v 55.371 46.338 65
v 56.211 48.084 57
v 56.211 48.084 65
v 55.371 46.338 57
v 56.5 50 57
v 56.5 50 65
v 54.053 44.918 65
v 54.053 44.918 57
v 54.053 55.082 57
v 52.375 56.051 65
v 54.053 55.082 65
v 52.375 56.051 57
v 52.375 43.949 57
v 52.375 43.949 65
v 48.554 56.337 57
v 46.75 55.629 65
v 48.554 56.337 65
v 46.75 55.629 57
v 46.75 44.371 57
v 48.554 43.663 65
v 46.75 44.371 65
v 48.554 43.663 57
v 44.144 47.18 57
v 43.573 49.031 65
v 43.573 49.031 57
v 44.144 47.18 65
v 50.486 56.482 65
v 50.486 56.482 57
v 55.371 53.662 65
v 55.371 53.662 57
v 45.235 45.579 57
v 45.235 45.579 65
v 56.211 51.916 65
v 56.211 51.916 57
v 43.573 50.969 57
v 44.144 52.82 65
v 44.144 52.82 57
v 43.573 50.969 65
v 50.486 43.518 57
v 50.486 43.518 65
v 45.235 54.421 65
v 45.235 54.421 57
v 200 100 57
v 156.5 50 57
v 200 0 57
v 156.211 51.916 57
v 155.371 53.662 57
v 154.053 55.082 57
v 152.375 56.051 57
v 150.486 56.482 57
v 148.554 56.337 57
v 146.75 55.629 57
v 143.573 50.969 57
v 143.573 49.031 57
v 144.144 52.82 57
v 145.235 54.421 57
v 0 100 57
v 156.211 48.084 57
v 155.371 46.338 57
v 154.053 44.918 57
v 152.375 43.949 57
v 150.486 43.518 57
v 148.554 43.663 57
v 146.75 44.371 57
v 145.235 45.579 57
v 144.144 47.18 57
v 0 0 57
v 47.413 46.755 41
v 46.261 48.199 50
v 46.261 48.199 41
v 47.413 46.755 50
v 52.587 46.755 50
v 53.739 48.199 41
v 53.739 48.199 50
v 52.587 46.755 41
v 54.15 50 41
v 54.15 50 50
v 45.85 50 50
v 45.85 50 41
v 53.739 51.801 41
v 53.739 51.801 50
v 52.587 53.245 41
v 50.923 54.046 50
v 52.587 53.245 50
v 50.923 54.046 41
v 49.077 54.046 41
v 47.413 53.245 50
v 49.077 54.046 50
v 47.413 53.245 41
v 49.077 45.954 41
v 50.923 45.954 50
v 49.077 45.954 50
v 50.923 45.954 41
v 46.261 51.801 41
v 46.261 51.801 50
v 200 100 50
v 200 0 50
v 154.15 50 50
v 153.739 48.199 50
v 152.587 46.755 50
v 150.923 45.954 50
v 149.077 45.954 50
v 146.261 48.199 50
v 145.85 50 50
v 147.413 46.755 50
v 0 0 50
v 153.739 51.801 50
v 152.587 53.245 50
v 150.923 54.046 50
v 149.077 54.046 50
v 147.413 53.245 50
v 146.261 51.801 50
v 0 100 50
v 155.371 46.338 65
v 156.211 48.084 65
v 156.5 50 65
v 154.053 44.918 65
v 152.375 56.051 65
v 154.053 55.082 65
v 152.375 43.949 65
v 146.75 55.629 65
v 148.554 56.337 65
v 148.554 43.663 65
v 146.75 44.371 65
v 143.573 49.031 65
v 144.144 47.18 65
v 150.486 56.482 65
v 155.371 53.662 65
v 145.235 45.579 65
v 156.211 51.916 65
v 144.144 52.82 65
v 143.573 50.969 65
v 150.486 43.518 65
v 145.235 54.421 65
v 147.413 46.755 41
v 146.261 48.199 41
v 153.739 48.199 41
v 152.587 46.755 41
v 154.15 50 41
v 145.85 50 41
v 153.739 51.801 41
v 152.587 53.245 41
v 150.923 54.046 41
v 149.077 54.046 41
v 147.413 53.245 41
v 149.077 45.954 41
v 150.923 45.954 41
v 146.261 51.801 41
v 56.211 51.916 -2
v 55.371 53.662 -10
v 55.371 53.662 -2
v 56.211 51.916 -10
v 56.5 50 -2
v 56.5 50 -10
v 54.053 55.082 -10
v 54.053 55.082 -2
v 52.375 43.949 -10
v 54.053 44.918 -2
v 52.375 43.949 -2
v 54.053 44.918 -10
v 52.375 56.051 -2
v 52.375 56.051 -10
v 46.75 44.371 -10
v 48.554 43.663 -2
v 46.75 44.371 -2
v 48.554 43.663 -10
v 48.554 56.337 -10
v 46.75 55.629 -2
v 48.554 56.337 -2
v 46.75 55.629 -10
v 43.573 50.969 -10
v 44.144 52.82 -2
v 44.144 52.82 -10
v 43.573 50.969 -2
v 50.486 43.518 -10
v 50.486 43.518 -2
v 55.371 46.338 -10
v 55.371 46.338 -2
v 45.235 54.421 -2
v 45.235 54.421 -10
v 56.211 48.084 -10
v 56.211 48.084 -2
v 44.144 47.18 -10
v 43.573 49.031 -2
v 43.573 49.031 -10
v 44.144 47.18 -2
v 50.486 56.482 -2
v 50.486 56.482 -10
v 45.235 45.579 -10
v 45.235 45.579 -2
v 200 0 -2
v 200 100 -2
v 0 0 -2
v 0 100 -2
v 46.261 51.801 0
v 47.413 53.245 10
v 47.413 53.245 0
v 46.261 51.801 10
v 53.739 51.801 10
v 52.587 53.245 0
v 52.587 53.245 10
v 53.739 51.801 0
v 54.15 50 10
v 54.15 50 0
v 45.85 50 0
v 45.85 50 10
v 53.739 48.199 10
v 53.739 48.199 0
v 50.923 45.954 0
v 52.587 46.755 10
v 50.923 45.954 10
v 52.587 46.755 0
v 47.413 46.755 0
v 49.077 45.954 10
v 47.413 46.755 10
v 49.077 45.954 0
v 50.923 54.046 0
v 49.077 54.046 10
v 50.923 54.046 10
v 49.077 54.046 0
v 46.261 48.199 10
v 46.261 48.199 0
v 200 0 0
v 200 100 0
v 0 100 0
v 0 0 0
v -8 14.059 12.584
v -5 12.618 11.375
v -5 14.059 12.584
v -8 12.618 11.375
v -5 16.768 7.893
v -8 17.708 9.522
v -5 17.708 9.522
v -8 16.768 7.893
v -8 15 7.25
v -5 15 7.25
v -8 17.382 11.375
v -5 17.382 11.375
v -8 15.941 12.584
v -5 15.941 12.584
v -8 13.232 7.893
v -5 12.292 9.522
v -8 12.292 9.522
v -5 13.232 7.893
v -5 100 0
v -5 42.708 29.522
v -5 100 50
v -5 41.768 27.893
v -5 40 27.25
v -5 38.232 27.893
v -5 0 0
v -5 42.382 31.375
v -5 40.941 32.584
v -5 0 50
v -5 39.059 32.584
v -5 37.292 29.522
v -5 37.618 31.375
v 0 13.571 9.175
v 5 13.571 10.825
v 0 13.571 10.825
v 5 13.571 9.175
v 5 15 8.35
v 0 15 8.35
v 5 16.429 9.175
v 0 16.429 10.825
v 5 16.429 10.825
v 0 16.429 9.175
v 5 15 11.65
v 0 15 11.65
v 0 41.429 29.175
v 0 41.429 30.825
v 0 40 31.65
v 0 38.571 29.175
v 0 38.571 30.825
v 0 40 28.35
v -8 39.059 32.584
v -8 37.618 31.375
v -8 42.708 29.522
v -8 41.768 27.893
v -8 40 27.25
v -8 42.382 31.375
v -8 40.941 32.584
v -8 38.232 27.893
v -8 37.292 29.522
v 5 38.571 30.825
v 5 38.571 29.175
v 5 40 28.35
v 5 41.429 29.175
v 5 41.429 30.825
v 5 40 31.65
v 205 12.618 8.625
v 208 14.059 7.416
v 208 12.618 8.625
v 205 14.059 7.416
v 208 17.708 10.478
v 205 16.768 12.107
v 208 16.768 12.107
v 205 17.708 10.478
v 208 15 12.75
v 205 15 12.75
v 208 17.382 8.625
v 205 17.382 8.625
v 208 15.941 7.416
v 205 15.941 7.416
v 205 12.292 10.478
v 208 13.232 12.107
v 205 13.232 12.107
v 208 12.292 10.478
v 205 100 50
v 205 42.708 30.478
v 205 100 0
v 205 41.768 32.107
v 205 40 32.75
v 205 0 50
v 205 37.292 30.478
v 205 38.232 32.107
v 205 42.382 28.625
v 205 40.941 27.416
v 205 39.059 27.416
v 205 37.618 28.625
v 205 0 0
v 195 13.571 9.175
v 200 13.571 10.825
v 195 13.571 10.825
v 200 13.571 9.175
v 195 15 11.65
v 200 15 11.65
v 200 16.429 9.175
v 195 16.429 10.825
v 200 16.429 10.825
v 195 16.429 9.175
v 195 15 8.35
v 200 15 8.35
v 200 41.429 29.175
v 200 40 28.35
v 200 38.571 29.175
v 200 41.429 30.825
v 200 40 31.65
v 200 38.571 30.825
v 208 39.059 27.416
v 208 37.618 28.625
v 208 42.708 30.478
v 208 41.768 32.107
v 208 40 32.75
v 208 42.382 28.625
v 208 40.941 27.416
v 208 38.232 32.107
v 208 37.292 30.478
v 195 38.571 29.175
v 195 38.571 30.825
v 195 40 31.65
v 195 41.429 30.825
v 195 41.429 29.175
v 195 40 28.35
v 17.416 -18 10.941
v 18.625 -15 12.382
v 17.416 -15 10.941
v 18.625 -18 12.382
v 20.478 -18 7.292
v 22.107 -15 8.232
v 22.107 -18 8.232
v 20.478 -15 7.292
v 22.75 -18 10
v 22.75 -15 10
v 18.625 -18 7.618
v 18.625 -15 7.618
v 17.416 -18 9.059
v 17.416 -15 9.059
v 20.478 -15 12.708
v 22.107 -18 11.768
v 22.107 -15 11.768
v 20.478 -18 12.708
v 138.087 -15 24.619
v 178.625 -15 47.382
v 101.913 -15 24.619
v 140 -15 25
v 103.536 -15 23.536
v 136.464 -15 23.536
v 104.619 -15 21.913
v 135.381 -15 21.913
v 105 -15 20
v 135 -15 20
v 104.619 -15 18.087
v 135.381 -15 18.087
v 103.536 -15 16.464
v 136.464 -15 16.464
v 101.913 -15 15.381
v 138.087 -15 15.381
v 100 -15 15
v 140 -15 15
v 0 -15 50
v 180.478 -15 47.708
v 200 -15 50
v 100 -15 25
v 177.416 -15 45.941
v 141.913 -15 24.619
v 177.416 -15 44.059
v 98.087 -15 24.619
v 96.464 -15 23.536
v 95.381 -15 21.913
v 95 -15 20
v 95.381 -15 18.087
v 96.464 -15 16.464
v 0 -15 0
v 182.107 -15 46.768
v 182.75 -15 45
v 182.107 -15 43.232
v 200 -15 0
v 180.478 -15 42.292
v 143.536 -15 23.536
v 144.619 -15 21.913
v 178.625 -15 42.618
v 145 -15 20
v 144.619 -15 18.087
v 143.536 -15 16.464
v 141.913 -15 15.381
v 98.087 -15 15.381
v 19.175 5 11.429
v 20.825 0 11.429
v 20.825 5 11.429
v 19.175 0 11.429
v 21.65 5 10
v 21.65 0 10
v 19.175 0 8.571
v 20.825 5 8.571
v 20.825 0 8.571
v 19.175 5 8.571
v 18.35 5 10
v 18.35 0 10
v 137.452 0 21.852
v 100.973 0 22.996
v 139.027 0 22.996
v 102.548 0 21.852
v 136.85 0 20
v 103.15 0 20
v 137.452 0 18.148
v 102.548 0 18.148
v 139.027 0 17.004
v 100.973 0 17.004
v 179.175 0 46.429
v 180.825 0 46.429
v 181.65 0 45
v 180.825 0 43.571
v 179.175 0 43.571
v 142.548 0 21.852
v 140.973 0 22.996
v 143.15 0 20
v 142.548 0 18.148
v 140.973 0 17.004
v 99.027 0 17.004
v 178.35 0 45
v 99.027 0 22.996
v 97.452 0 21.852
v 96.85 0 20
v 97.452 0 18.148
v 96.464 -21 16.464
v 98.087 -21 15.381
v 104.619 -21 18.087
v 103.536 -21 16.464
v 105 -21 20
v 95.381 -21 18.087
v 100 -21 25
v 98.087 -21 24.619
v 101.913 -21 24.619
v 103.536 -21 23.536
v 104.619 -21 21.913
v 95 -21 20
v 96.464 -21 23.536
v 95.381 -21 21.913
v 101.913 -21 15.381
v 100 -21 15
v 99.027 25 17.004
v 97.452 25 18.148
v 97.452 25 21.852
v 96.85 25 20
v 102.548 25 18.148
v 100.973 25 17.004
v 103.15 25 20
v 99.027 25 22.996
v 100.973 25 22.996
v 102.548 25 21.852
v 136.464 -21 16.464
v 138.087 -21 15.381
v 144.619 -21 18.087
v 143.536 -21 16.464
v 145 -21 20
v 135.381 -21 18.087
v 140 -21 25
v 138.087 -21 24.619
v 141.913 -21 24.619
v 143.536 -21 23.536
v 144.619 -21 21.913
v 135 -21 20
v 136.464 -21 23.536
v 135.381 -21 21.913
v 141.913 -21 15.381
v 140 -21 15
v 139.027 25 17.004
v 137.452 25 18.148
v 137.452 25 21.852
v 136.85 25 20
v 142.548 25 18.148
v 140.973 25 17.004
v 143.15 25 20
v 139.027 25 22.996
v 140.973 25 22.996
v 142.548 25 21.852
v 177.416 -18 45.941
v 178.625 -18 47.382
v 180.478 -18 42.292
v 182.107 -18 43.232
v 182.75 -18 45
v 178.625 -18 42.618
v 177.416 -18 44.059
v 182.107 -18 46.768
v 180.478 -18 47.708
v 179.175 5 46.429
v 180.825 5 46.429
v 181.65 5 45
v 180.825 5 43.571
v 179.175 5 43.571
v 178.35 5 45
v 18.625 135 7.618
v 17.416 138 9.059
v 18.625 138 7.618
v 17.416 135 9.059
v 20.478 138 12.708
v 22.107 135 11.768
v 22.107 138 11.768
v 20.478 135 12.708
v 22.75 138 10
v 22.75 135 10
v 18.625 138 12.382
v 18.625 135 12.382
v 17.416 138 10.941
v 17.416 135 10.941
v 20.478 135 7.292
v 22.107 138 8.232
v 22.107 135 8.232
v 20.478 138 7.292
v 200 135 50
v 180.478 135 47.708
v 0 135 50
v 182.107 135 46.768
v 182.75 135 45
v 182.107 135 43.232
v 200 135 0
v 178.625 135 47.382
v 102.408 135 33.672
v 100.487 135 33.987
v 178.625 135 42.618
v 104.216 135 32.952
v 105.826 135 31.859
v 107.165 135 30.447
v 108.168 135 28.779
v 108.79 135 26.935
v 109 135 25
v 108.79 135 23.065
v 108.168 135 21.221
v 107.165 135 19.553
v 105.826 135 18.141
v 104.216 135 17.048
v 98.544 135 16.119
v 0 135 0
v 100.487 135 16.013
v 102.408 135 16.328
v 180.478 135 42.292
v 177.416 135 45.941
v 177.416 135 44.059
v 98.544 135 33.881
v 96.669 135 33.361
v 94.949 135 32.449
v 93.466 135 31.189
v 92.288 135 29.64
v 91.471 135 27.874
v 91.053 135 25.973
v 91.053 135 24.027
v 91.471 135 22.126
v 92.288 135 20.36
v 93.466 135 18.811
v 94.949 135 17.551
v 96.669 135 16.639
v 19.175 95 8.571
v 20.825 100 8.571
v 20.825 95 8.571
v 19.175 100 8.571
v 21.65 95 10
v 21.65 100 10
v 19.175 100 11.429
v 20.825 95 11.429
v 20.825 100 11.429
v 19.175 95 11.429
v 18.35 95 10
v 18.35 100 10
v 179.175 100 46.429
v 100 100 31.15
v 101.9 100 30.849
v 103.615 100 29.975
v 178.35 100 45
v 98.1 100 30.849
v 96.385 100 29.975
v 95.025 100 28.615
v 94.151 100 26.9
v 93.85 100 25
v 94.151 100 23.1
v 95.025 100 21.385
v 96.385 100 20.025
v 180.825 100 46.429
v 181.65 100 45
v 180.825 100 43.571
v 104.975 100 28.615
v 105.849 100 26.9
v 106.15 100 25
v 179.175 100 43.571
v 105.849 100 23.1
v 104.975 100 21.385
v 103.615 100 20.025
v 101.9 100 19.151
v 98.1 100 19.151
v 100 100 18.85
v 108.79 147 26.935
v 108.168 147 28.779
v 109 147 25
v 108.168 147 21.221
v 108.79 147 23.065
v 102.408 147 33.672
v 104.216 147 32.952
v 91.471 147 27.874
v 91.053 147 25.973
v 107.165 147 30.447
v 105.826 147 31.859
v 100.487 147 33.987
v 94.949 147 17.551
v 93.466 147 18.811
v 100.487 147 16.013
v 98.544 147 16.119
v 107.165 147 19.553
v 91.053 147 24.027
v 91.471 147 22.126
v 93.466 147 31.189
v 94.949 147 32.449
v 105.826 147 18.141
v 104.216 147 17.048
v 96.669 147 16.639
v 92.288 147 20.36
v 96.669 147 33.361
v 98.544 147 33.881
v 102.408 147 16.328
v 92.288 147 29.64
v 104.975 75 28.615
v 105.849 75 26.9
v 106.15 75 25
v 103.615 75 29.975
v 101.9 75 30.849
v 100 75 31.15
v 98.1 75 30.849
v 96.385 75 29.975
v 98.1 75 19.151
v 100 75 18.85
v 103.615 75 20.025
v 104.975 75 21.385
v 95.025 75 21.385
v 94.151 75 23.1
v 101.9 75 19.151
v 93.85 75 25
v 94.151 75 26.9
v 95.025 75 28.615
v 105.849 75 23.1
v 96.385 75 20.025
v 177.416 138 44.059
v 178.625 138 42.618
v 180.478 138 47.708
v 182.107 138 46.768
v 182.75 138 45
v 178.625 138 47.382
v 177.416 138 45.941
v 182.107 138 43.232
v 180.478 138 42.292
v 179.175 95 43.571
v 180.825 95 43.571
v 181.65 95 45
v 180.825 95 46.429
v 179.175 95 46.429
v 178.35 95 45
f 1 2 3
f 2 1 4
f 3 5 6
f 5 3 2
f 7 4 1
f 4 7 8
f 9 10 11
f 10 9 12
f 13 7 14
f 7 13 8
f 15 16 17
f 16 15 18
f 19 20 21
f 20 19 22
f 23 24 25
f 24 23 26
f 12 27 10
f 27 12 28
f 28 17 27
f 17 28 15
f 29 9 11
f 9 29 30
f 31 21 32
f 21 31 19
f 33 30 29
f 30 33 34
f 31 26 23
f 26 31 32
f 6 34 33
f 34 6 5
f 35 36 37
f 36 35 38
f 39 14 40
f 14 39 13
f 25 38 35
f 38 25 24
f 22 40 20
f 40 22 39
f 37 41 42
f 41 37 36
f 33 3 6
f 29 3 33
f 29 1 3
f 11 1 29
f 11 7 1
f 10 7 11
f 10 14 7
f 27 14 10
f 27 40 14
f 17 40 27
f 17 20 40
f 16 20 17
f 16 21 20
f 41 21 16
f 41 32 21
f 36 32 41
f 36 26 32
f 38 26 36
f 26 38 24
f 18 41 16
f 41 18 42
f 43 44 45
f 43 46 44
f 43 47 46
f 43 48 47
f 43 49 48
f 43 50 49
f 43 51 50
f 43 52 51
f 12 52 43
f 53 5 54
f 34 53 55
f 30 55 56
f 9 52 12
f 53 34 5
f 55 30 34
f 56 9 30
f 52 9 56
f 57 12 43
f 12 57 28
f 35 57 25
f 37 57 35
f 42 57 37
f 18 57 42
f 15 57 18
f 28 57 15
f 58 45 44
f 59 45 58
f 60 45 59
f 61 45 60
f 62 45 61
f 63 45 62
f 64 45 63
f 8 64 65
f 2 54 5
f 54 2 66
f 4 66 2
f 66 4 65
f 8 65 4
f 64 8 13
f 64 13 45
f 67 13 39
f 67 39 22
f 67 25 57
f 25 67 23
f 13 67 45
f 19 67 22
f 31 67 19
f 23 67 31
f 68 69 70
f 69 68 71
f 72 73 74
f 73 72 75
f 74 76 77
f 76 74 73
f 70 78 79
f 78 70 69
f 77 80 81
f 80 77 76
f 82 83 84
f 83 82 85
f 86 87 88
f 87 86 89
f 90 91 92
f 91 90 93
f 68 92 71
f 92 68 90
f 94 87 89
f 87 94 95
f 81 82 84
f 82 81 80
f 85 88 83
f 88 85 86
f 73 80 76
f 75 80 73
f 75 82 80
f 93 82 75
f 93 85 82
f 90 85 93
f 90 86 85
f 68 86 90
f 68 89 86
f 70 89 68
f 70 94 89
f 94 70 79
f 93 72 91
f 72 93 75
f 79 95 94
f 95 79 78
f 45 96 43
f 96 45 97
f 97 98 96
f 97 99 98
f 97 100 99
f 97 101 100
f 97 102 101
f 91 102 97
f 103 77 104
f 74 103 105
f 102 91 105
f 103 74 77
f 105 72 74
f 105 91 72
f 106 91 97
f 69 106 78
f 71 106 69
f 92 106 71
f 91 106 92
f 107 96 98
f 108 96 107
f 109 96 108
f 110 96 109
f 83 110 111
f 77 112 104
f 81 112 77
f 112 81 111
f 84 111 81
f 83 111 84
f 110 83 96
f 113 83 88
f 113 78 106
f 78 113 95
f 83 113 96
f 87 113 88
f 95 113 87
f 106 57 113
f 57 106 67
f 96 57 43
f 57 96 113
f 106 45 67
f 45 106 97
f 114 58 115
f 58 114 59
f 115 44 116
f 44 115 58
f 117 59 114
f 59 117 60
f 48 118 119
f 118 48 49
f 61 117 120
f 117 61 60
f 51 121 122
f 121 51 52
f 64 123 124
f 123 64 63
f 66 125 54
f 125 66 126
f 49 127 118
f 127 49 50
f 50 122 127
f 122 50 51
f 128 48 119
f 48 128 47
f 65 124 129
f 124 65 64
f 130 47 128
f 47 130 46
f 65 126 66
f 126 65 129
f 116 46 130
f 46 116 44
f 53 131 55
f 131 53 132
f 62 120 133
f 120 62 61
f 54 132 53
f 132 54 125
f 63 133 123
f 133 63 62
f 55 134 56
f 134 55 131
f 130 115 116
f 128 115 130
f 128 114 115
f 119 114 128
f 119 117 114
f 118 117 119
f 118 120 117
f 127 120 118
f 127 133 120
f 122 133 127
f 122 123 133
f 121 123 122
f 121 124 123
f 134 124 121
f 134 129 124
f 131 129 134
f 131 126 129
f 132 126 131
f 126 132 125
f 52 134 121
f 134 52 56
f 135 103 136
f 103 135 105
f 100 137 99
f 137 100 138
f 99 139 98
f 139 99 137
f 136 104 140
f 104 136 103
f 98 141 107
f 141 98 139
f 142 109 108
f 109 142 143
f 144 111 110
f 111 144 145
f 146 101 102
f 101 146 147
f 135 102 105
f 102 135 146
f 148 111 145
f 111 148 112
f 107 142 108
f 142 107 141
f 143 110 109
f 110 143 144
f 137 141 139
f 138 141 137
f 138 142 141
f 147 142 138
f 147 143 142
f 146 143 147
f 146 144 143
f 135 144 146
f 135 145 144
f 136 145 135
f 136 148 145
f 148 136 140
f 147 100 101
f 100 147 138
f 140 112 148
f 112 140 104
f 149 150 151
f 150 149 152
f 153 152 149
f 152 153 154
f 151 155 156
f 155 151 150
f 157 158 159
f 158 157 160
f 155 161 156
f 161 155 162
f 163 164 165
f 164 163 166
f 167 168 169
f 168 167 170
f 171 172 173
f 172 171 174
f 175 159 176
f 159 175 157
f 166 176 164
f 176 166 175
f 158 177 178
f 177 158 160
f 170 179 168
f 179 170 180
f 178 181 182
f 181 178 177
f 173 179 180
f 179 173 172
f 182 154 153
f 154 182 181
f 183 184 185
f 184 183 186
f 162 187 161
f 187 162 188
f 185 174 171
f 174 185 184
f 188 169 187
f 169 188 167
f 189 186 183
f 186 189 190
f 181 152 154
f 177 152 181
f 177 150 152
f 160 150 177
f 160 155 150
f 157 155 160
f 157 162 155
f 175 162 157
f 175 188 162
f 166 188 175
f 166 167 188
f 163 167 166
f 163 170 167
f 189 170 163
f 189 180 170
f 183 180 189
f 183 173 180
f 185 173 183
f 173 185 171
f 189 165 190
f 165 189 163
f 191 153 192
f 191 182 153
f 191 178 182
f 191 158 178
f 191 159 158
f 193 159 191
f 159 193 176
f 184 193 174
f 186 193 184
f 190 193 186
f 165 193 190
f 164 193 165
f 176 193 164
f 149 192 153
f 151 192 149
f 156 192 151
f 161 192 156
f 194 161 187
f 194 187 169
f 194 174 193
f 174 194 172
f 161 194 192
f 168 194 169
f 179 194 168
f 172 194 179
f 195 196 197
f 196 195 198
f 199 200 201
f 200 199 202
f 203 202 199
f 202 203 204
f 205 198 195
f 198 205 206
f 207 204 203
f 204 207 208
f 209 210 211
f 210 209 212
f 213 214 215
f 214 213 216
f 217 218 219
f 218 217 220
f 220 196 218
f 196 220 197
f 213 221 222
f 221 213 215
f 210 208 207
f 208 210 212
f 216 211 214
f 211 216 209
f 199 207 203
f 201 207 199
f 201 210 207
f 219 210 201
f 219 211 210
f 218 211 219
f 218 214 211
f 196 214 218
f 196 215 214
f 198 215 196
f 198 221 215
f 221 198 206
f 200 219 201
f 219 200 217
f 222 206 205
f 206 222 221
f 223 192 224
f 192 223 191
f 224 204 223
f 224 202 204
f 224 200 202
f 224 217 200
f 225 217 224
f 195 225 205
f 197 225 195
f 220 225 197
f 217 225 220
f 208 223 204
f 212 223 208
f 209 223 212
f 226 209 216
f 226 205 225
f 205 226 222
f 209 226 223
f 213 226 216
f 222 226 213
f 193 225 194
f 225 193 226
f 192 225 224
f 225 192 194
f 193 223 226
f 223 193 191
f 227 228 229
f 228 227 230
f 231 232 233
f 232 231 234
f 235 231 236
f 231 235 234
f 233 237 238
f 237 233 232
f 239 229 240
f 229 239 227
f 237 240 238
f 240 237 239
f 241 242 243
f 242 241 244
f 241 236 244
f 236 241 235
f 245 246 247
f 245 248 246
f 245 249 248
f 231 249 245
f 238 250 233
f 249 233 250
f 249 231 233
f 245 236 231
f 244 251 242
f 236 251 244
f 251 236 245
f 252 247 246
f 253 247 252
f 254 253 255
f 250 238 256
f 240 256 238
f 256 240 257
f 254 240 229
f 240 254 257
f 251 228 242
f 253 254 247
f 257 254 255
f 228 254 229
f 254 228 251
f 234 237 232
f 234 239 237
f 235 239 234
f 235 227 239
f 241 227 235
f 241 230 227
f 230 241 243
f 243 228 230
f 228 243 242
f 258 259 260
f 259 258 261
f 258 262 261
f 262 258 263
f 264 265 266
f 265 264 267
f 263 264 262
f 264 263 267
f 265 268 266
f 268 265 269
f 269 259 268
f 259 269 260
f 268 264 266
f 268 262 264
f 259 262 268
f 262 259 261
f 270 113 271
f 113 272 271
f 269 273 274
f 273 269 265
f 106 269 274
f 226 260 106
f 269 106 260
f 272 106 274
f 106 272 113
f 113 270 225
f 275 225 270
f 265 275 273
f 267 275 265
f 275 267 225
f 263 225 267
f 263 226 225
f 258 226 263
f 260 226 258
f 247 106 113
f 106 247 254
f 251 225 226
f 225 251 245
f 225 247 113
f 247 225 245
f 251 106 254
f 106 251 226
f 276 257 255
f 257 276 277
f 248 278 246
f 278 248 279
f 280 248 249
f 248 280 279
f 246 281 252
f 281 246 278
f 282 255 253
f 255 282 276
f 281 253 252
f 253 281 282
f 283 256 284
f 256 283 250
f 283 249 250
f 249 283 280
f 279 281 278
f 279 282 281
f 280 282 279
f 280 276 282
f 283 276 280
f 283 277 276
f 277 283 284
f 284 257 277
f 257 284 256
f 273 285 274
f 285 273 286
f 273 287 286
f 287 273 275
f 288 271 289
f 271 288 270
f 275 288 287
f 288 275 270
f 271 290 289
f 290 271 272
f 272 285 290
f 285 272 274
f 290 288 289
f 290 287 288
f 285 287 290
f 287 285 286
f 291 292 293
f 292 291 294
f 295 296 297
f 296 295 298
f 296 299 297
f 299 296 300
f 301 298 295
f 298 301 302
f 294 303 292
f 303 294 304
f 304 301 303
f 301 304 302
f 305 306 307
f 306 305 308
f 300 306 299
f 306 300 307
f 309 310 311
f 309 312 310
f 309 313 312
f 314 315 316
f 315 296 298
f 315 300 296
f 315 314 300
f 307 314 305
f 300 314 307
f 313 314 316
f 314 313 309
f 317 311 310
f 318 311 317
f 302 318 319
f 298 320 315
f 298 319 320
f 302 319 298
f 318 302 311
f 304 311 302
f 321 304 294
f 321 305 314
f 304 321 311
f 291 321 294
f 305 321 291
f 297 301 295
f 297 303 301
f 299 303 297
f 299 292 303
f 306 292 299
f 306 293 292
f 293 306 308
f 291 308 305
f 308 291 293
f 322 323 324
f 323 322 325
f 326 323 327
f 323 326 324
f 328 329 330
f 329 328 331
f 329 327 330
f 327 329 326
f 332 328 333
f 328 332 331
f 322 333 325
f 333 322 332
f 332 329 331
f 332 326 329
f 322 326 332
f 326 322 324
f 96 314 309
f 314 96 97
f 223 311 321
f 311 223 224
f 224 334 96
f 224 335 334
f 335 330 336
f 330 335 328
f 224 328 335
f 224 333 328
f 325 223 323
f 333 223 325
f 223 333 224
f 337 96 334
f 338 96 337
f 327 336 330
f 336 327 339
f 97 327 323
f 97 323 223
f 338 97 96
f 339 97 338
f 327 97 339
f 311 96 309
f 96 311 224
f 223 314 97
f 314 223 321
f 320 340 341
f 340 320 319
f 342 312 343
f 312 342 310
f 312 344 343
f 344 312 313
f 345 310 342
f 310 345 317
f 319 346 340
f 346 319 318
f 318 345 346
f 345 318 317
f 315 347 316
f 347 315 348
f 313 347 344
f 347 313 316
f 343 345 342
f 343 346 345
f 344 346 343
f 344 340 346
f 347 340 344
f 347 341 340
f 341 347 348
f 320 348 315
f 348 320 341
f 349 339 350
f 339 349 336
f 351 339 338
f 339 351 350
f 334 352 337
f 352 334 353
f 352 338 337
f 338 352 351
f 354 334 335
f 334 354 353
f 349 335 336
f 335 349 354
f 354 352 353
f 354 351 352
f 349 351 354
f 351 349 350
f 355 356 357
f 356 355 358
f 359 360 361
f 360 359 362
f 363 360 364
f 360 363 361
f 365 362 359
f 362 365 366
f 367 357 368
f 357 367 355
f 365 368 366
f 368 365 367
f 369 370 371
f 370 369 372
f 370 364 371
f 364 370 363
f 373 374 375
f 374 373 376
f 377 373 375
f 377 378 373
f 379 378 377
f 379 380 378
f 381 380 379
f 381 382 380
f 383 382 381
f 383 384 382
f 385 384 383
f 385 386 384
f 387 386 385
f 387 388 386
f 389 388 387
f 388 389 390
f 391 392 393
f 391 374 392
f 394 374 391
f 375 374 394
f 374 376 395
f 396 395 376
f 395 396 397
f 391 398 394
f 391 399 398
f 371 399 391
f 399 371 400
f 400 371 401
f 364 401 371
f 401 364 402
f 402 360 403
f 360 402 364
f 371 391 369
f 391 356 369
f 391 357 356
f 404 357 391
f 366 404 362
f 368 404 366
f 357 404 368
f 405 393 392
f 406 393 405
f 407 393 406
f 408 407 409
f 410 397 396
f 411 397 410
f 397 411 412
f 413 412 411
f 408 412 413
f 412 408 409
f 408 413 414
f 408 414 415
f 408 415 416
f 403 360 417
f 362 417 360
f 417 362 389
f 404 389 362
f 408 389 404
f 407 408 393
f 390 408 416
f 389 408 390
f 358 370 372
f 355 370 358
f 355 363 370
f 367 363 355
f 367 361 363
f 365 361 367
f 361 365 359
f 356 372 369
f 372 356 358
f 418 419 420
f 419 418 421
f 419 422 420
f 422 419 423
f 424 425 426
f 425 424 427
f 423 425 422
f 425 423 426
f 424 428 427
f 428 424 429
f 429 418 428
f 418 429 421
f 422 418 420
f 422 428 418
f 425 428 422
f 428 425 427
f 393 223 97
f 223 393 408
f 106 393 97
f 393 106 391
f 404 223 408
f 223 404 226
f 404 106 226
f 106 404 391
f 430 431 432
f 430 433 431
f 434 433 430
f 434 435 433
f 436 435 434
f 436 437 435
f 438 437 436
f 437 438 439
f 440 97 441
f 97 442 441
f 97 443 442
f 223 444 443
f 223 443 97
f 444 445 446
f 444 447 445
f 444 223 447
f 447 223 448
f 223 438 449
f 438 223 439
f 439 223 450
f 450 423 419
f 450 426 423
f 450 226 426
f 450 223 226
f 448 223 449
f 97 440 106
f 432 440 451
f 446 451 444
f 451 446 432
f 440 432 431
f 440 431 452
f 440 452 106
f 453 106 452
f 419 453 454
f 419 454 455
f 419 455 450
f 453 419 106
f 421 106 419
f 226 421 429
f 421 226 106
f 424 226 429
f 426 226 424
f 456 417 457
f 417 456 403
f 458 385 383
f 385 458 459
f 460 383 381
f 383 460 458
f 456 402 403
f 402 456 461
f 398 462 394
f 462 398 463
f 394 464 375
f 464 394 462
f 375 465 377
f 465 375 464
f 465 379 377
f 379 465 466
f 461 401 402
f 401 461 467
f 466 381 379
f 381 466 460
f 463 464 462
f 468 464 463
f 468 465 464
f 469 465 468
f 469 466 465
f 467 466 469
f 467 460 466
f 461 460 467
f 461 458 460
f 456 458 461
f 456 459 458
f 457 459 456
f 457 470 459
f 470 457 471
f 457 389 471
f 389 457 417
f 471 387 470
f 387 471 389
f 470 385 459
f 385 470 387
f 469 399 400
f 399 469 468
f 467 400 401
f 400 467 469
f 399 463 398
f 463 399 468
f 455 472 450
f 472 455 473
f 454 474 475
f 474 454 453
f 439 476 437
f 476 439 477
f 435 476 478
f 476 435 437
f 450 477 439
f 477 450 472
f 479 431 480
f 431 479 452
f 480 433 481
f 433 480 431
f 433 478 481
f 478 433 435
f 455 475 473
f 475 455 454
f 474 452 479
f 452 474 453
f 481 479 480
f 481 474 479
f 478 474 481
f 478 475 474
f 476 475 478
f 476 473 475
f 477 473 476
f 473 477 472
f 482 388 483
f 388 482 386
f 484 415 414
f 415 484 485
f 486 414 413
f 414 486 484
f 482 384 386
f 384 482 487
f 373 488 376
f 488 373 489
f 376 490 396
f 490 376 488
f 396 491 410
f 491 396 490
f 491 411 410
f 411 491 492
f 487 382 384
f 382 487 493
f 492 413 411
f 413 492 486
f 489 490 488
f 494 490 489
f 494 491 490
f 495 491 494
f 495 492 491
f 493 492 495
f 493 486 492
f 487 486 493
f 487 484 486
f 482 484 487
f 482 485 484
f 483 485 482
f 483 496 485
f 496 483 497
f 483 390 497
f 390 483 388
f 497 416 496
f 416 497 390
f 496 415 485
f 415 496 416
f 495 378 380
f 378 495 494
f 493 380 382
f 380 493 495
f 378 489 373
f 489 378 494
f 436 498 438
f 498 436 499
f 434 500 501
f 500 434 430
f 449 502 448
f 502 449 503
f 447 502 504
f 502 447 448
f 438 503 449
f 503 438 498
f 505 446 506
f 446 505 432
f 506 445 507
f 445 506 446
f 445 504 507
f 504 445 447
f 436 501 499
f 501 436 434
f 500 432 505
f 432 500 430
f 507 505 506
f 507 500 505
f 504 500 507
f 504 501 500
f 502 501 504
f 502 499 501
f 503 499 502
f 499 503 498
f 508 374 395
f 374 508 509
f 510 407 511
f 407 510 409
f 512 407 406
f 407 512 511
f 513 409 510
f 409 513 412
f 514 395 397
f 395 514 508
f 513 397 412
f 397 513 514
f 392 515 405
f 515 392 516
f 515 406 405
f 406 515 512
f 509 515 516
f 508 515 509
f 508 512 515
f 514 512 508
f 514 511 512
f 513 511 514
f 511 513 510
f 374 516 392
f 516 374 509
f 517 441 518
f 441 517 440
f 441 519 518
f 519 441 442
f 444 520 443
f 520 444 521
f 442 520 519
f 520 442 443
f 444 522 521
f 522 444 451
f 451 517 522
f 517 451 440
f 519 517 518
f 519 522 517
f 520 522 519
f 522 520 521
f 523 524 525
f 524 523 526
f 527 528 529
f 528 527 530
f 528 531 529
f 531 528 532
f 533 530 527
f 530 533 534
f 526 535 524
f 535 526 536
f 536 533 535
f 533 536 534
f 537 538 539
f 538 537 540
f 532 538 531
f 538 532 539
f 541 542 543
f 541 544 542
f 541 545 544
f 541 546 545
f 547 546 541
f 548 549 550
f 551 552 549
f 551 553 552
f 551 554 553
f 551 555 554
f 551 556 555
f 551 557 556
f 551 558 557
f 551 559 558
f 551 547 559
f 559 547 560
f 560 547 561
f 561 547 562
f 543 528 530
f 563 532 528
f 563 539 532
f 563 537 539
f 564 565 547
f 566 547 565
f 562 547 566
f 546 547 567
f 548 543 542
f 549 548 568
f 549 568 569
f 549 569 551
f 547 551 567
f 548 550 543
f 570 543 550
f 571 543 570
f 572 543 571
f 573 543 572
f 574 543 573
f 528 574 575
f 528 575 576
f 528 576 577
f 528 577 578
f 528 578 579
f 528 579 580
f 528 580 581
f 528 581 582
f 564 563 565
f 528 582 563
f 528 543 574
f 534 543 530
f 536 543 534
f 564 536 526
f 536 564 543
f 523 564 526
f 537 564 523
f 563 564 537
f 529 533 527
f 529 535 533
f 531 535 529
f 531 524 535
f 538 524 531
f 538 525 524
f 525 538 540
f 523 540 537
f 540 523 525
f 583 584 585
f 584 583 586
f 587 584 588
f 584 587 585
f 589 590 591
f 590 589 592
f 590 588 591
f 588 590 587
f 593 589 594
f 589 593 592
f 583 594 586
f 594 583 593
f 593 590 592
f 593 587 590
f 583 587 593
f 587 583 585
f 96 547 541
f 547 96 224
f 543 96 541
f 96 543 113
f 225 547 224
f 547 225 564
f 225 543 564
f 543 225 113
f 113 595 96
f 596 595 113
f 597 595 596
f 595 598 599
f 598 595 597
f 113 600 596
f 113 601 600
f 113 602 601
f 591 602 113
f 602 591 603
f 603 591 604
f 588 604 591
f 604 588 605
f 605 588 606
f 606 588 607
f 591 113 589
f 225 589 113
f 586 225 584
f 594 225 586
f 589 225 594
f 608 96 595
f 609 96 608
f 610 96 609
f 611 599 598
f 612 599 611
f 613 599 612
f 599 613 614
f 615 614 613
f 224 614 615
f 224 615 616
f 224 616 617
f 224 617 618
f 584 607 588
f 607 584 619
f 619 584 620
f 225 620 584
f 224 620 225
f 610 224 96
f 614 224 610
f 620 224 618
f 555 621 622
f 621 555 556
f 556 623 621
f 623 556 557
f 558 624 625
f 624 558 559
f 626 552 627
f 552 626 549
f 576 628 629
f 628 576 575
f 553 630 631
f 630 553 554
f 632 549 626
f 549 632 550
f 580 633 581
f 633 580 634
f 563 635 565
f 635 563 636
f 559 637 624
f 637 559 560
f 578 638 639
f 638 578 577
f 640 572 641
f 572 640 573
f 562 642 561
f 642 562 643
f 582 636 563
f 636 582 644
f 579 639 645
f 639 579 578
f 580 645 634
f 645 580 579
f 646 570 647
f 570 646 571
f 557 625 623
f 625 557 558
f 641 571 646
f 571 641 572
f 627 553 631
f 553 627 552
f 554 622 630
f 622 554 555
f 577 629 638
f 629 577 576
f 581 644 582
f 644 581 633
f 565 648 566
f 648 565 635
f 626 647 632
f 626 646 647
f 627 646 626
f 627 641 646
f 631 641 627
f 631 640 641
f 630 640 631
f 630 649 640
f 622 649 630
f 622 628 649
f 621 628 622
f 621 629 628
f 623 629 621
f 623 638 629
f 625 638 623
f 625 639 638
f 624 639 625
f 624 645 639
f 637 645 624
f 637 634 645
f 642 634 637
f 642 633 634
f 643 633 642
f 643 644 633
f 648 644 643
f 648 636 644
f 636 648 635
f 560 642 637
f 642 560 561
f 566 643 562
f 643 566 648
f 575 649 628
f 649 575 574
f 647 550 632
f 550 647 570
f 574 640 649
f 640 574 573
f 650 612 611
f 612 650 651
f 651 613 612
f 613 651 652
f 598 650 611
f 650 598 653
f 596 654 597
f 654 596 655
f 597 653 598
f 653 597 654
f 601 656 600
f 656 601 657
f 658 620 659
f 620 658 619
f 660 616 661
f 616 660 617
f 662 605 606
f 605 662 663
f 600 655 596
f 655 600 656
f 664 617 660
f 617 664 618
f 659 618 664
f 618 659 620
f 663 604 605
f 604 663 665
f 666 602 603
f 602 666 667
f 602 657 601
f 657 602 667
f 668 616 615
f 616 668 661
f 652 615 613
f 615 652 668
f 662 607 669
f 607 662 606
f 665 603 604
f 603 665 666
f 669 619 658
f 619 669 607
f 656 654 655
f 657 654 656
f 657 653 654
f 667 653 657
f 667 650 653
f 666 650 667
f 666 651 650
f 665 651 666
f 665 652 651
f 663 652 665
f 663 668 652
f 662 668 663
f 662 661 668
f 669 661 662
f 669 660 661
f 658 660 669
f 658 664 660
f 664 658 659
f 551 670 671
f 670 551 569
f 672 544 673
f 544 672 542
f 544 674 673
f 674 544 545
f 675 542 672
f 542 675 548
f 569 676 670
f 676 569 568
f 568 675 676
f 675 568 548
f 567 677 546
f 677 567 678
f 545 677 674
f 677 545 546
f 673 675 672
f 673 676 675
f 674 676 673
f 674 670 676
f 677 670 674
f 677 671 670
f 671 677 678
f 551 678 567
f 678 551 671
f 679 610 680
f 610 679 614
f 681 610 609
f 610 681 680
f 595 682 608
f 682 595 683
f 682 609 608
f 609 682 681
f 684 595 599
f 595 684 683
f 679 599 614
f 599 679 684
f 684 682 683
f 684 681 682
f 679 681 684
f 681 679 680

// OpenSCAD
union(){union(){union(){union(){union(){union(){
union(){translate(v = [0, 0, 50])
union(){union(){difference(){difference(){cube(size = [200, 100, 7]);
translate(v = [50, 50, 7])
rotate(a = [180, 0])
union(){color("Gainsboro"){translate(v = [0, 0, -8])
cylinder(h = 8, r = 6.500);
}
color("DarkGray"){cylinder(h = 16, r = 4.150);
}
}
}
translate(v = [150, 50, 7])
rotate(a = [180, 0])
union(){color("Gainsboro"){translate(v = [0, 0, -8])
cylinder(h = 8, r = 6.500);
}
color("DarkGray"){cylinder(h = 16, r = 4.150);
}
}
}
translate(v = [50, 50, 7])
rotate(a = [180, 0])
union(){color("Gainsboro"){translate(v = [0, 0, -8])
cylinder(h = 8, r = 6.500);
}
color("DarkGray"){cylinder(h = 16, r = 4.150);
}
}
}
translate(v = [150, 50, 7])
rotate(a = [180, 0])
union(){color("Gainsboro"){translate(v = [0, 0, -8])
cylinder(h = 8, r = 6.500);
}
color("DarkGray"){cylinder(h = 16, r = 4.150);
}
}
}
}
}
union(){translate(v = [0, 0, -2])
union(){difference(){cube(size = [200, 100, 2]);
translate(v = [50, 50])
union(){color("Gainsboro"){translate(v = [0, 0, -8])
cylinder(h = 8, r = 6.500);
}
color("DarkGray"){cylinder(h = 12, r = 4.150);
}
}
}
translate(v = [50, 50])
union(){color("Gainsboro"){translate(v = [0, 0, -8])
cylinder(h = 8, r = 6.500);
}
color("DarkGray"){cylinder(h = 12, r = 4.150);
}
}
}
}
}
union(){translate(v = [-5, 0])
union(){union(){difference(){difference(){cube(size = [5, 100, 50]);
translate(v = [0, 15, 10])
rotate(a = [0, 90])
union(){color("Gainsboro"){translate(v = [0, 0, -3])
cylinder(h = 3, r = 2.750);
}
color("DarkGray"){cylinder(h = 10, r = 1.650);
}
}
}
translate(v = [0, 40, 30])
rotate(a = [0, 90])
union(){color("Gainsboro"){translate(v = [0, 0, -3])
cylinder(h = 3, r = 2.750);
}
color("DarkGray"){cylinder(h = 10, r = 1.650);
}
}
}
translate(v = [0, 15, 10])
rotate(a = [0, 90])
union(){color("Gainsboro"){translate(v = [0, 0, -3])
cylinder(h = 3, r = 2.750);
}
color("DarkGray"){cylinder(h = 10, r = 1.650);
}
}
}
translate(v = [0, 40, 30])
rotate(a = [0, 90])
union(){color("Gainsboro"){translate(v = [0, 0, -3])
cylinder(h = 3, r = 2.750);
}
color("DarkGray"){cylinder(h = 10, r = 1.650);
}
}
}
}
}
union(){translate(v = [200, 0])
union(){union(){difference(){difference(){cube(size = [5, 100, 50]);
translate(v = [5, 15, 10])
rotate(a = [0, -90])
union(){color("Gainsboro"){translate(v = [0, 0, -3])
cylinder(h = 3, r = 2.750);
}
color("DarkGray"){cylinder(h = 10, r = 1.650);
}
}
}
translate(v = [5, 40, 30])
rotate(a = [0, -90])
union(){color("Gainsboro"){translate(v = [0, 0, -3])
cylinder(h = 3, r = 2.750);
}
color("DarkGray"){cylinder(h = 10, r = 1.650);
}
}
}
translate(v = [5, 15, 10])
rotate(a = [0, -90])
union(){color("Gainsboro"){translate(v = [0, 0, -3])
cylinder(h = 3, r = 2.750);
}
color("DarkGray"){cylinder(h = 10, r = 1.650);
}
}
}
translate(v = [5, 40, 30])
rotate(a = [0, -90])
union(){color("Gainsboro"){translate(v = [0, 0, -3])
cylinder(h = 3, r = 2.750);
}
color("DarkGray"){cylinder(h = 10, r = 1.650);
}
}
}
}
}
union(){translate(v = [0, -15])
union(){union(){union(){union(){difference(){difference(){difference(){difference(){cube(size = [200, 15, 50]);
translate(v = [20, 0, 10])
rotate(a = [-90, 0])
union(){color("Gainsboro"){translate(v = [0, 0, -3])
cylinder(h = 3, r = 2.750);
}
color("Gainsboro"){cylinder(h = 2, r = 1.650);
}
color("DarkGray"){translate(v = [0, 0, 2])
cylinder(h = 18, r = 1.650);
}
}
}
translate(v = [100, 0, 20])
rotate(a = [-90, 0])
union(){color("Gainsboro"){translate(v = [0, 0, -6])
cylinder(h = 6, r = 5.000);
}
color("Gainsboro"){cylinder(h = 16, r = 3.150);
}
color("DarkGray"){translate(v = [0, 0, 16])
cylinder(h = 24, r = 3.150);
}
}
}
translate(v = [140, 0, 20])
rotate(a = [-90, 0])
union(){color("Gainsboro"){translate(v = [0, 0, -6])
cylinder(h = 6, r = 5.000);
}
color("Gainsboro"){cylinder(h = 16, r = 3.150);
}
color("DarkGray"){translate(v = [0, 0, 16])
cylinder(h = 24, r = 3.150);
}
}
}
translate(v = [180, 0, 45])
rotate(a = [-90, 0])
union(){color("Gainsboro"){translate(v = [0, 0, -3])
cylinder(h = 3, r = 2.750);
}
color("Gainsboro"){cylinder(h = 2, r = 1.650);
}
color("DarkGray"){translate(v = [0, 0, 2])
cylinder(h = 18, r = 1.650);
}
}
}
translate(v = [20, 0, 10])
rotate(a = [-90, 0])
union(){color("Gainsboro"){translate(v = [0, 0, -3])
cylinder(h = 3, r = 2.750);
}
color("Gainsboro"){cylinder(h = 2, r = 1.650);
}
color("DarkGray"){translate(v = [0, 0, 2])
cylinder(h = 18, r = 1.650);
}
}
}
translate(v = [100, 0, 20])
rotate(a = [-90, 0])
union(){color("Gainsboro"){translate(v = [0, 0, -6])
cylinder(h = 6, r = 5.000);
}
color("Gainsboro"){cylinder(h = 16, r = 3.150);
}
color("DarkGray"){translate(v = [0, 0, 16])
cylinder(h = 24, r = 3.150);
}
}
}
translate(v = [140, 0, 20])
rotate(a = [-90, 0])
union(){color("Gainsboro"){translate(v = [0, 0, -6])
cylinder(h = 6, r = 5.000);
}
color("Gainsboro"){cylinder(h = 16, r = 3.150);
}
color("DarkGray"){translate(v = [0, 0, 16])
cylinder(h = 24, r = 3.150);
}
}
}
translate(v = [180, 0, 45])
rotate(a = [-90, 0])
union(){color("Gainsboro"){translate(v = [0, 0, -3])
cylinder(h = 3, r = 2.750);
}
color("Gainsboro"){cylinder(h = 2, r = 1.650);
}
color("DarkGray"){translate(v = [0, 0, 2])
cylinder(h = 18, r = 1.650);
}
}
}
}
}
union(){translate(v = [0, 100])
union(){union(){union(){difference(){difference(){difference(){cube(size = [200, 35, 50]);
translate(v = [20, 35, 10])
rotate(a = [90, 0])
union(){color("Gainsboro"){translate(v = [0, 0, -3])
cylinder(h = 3, r = 2.750);
}
color("Gainsboro"){cylinder(h = 22, r = 1.650);
}
color("DarkGray"){translate(v = [0, 0, 22])
cylinder(h = 18, r = 1.650);
}
}
}
translate(v = [100, 35, 25])
rotate(a = [90, 0])
union(){color("Gainsboro"){translate(v = [0, 0, -12])
cylinder(h = 12, r = 9.000);
}
color("Gainsboro"){cylinder(h = 24, r = 6.150);
}
color("DarkGray"){translate(v = [0, 0, 24])
cylinder(h = 36, r = 6.150);
}
}
}
translate(v = [180, 35, 45])
rotate(a = [90, 0])
union(){color("Gainsboro"){translate(v = [0, 0, -3])
cylinder(h = 3, r = 2.750);
}
color("Gainsboro"){cylinder(h = 22, r = 1.650);
}
color("DarkGray"){translate(v = [0, 0, 22])
cylinder(h = 18, r = 1.650);
}
}
}
translate(v = [20, 35, 10])
rotate(a = [90, 0])
union(){color("Gainsboro"){translate(v = [0, 0, -3])
cylinder(h = 3, r = 2.750);
}
color("Gainsboro"){cylinder(h = 22, r = 1.650);
}
color("DarkGray"){translate(v = [0, 0, 22])
cylinder(h = 18, r = 1.650);
}
}
}
translate(v = [100, 35, 25])
rotate(a = [90, 0])
union(){color("Gainsboro"){translate(v = [0, 0, -12])
cylinder(h = 12, r = 9.000);
}
color("Gainsboro"){cylinder(h = 24, r = 6.150);
}
color("DarkGray"){translate(v = [0, 0, 24])
cylinder(h = 36, r = 6.150);
}
}
}
translate(v = [180, 35, 45])
rotate(a = [90, 0])
union(){color("Gainsboro"){translate(v = [0, 0, -3])
cylinder(h = 3, r = 2.750);
}
color("Gainsboro"){cylinder(h = 22, r = 1.650);
}
color("DarkGray"){translate(v = [0, 0, 22])
cylinder(h = 18, r = 1.650);
}
}
}
}
}
